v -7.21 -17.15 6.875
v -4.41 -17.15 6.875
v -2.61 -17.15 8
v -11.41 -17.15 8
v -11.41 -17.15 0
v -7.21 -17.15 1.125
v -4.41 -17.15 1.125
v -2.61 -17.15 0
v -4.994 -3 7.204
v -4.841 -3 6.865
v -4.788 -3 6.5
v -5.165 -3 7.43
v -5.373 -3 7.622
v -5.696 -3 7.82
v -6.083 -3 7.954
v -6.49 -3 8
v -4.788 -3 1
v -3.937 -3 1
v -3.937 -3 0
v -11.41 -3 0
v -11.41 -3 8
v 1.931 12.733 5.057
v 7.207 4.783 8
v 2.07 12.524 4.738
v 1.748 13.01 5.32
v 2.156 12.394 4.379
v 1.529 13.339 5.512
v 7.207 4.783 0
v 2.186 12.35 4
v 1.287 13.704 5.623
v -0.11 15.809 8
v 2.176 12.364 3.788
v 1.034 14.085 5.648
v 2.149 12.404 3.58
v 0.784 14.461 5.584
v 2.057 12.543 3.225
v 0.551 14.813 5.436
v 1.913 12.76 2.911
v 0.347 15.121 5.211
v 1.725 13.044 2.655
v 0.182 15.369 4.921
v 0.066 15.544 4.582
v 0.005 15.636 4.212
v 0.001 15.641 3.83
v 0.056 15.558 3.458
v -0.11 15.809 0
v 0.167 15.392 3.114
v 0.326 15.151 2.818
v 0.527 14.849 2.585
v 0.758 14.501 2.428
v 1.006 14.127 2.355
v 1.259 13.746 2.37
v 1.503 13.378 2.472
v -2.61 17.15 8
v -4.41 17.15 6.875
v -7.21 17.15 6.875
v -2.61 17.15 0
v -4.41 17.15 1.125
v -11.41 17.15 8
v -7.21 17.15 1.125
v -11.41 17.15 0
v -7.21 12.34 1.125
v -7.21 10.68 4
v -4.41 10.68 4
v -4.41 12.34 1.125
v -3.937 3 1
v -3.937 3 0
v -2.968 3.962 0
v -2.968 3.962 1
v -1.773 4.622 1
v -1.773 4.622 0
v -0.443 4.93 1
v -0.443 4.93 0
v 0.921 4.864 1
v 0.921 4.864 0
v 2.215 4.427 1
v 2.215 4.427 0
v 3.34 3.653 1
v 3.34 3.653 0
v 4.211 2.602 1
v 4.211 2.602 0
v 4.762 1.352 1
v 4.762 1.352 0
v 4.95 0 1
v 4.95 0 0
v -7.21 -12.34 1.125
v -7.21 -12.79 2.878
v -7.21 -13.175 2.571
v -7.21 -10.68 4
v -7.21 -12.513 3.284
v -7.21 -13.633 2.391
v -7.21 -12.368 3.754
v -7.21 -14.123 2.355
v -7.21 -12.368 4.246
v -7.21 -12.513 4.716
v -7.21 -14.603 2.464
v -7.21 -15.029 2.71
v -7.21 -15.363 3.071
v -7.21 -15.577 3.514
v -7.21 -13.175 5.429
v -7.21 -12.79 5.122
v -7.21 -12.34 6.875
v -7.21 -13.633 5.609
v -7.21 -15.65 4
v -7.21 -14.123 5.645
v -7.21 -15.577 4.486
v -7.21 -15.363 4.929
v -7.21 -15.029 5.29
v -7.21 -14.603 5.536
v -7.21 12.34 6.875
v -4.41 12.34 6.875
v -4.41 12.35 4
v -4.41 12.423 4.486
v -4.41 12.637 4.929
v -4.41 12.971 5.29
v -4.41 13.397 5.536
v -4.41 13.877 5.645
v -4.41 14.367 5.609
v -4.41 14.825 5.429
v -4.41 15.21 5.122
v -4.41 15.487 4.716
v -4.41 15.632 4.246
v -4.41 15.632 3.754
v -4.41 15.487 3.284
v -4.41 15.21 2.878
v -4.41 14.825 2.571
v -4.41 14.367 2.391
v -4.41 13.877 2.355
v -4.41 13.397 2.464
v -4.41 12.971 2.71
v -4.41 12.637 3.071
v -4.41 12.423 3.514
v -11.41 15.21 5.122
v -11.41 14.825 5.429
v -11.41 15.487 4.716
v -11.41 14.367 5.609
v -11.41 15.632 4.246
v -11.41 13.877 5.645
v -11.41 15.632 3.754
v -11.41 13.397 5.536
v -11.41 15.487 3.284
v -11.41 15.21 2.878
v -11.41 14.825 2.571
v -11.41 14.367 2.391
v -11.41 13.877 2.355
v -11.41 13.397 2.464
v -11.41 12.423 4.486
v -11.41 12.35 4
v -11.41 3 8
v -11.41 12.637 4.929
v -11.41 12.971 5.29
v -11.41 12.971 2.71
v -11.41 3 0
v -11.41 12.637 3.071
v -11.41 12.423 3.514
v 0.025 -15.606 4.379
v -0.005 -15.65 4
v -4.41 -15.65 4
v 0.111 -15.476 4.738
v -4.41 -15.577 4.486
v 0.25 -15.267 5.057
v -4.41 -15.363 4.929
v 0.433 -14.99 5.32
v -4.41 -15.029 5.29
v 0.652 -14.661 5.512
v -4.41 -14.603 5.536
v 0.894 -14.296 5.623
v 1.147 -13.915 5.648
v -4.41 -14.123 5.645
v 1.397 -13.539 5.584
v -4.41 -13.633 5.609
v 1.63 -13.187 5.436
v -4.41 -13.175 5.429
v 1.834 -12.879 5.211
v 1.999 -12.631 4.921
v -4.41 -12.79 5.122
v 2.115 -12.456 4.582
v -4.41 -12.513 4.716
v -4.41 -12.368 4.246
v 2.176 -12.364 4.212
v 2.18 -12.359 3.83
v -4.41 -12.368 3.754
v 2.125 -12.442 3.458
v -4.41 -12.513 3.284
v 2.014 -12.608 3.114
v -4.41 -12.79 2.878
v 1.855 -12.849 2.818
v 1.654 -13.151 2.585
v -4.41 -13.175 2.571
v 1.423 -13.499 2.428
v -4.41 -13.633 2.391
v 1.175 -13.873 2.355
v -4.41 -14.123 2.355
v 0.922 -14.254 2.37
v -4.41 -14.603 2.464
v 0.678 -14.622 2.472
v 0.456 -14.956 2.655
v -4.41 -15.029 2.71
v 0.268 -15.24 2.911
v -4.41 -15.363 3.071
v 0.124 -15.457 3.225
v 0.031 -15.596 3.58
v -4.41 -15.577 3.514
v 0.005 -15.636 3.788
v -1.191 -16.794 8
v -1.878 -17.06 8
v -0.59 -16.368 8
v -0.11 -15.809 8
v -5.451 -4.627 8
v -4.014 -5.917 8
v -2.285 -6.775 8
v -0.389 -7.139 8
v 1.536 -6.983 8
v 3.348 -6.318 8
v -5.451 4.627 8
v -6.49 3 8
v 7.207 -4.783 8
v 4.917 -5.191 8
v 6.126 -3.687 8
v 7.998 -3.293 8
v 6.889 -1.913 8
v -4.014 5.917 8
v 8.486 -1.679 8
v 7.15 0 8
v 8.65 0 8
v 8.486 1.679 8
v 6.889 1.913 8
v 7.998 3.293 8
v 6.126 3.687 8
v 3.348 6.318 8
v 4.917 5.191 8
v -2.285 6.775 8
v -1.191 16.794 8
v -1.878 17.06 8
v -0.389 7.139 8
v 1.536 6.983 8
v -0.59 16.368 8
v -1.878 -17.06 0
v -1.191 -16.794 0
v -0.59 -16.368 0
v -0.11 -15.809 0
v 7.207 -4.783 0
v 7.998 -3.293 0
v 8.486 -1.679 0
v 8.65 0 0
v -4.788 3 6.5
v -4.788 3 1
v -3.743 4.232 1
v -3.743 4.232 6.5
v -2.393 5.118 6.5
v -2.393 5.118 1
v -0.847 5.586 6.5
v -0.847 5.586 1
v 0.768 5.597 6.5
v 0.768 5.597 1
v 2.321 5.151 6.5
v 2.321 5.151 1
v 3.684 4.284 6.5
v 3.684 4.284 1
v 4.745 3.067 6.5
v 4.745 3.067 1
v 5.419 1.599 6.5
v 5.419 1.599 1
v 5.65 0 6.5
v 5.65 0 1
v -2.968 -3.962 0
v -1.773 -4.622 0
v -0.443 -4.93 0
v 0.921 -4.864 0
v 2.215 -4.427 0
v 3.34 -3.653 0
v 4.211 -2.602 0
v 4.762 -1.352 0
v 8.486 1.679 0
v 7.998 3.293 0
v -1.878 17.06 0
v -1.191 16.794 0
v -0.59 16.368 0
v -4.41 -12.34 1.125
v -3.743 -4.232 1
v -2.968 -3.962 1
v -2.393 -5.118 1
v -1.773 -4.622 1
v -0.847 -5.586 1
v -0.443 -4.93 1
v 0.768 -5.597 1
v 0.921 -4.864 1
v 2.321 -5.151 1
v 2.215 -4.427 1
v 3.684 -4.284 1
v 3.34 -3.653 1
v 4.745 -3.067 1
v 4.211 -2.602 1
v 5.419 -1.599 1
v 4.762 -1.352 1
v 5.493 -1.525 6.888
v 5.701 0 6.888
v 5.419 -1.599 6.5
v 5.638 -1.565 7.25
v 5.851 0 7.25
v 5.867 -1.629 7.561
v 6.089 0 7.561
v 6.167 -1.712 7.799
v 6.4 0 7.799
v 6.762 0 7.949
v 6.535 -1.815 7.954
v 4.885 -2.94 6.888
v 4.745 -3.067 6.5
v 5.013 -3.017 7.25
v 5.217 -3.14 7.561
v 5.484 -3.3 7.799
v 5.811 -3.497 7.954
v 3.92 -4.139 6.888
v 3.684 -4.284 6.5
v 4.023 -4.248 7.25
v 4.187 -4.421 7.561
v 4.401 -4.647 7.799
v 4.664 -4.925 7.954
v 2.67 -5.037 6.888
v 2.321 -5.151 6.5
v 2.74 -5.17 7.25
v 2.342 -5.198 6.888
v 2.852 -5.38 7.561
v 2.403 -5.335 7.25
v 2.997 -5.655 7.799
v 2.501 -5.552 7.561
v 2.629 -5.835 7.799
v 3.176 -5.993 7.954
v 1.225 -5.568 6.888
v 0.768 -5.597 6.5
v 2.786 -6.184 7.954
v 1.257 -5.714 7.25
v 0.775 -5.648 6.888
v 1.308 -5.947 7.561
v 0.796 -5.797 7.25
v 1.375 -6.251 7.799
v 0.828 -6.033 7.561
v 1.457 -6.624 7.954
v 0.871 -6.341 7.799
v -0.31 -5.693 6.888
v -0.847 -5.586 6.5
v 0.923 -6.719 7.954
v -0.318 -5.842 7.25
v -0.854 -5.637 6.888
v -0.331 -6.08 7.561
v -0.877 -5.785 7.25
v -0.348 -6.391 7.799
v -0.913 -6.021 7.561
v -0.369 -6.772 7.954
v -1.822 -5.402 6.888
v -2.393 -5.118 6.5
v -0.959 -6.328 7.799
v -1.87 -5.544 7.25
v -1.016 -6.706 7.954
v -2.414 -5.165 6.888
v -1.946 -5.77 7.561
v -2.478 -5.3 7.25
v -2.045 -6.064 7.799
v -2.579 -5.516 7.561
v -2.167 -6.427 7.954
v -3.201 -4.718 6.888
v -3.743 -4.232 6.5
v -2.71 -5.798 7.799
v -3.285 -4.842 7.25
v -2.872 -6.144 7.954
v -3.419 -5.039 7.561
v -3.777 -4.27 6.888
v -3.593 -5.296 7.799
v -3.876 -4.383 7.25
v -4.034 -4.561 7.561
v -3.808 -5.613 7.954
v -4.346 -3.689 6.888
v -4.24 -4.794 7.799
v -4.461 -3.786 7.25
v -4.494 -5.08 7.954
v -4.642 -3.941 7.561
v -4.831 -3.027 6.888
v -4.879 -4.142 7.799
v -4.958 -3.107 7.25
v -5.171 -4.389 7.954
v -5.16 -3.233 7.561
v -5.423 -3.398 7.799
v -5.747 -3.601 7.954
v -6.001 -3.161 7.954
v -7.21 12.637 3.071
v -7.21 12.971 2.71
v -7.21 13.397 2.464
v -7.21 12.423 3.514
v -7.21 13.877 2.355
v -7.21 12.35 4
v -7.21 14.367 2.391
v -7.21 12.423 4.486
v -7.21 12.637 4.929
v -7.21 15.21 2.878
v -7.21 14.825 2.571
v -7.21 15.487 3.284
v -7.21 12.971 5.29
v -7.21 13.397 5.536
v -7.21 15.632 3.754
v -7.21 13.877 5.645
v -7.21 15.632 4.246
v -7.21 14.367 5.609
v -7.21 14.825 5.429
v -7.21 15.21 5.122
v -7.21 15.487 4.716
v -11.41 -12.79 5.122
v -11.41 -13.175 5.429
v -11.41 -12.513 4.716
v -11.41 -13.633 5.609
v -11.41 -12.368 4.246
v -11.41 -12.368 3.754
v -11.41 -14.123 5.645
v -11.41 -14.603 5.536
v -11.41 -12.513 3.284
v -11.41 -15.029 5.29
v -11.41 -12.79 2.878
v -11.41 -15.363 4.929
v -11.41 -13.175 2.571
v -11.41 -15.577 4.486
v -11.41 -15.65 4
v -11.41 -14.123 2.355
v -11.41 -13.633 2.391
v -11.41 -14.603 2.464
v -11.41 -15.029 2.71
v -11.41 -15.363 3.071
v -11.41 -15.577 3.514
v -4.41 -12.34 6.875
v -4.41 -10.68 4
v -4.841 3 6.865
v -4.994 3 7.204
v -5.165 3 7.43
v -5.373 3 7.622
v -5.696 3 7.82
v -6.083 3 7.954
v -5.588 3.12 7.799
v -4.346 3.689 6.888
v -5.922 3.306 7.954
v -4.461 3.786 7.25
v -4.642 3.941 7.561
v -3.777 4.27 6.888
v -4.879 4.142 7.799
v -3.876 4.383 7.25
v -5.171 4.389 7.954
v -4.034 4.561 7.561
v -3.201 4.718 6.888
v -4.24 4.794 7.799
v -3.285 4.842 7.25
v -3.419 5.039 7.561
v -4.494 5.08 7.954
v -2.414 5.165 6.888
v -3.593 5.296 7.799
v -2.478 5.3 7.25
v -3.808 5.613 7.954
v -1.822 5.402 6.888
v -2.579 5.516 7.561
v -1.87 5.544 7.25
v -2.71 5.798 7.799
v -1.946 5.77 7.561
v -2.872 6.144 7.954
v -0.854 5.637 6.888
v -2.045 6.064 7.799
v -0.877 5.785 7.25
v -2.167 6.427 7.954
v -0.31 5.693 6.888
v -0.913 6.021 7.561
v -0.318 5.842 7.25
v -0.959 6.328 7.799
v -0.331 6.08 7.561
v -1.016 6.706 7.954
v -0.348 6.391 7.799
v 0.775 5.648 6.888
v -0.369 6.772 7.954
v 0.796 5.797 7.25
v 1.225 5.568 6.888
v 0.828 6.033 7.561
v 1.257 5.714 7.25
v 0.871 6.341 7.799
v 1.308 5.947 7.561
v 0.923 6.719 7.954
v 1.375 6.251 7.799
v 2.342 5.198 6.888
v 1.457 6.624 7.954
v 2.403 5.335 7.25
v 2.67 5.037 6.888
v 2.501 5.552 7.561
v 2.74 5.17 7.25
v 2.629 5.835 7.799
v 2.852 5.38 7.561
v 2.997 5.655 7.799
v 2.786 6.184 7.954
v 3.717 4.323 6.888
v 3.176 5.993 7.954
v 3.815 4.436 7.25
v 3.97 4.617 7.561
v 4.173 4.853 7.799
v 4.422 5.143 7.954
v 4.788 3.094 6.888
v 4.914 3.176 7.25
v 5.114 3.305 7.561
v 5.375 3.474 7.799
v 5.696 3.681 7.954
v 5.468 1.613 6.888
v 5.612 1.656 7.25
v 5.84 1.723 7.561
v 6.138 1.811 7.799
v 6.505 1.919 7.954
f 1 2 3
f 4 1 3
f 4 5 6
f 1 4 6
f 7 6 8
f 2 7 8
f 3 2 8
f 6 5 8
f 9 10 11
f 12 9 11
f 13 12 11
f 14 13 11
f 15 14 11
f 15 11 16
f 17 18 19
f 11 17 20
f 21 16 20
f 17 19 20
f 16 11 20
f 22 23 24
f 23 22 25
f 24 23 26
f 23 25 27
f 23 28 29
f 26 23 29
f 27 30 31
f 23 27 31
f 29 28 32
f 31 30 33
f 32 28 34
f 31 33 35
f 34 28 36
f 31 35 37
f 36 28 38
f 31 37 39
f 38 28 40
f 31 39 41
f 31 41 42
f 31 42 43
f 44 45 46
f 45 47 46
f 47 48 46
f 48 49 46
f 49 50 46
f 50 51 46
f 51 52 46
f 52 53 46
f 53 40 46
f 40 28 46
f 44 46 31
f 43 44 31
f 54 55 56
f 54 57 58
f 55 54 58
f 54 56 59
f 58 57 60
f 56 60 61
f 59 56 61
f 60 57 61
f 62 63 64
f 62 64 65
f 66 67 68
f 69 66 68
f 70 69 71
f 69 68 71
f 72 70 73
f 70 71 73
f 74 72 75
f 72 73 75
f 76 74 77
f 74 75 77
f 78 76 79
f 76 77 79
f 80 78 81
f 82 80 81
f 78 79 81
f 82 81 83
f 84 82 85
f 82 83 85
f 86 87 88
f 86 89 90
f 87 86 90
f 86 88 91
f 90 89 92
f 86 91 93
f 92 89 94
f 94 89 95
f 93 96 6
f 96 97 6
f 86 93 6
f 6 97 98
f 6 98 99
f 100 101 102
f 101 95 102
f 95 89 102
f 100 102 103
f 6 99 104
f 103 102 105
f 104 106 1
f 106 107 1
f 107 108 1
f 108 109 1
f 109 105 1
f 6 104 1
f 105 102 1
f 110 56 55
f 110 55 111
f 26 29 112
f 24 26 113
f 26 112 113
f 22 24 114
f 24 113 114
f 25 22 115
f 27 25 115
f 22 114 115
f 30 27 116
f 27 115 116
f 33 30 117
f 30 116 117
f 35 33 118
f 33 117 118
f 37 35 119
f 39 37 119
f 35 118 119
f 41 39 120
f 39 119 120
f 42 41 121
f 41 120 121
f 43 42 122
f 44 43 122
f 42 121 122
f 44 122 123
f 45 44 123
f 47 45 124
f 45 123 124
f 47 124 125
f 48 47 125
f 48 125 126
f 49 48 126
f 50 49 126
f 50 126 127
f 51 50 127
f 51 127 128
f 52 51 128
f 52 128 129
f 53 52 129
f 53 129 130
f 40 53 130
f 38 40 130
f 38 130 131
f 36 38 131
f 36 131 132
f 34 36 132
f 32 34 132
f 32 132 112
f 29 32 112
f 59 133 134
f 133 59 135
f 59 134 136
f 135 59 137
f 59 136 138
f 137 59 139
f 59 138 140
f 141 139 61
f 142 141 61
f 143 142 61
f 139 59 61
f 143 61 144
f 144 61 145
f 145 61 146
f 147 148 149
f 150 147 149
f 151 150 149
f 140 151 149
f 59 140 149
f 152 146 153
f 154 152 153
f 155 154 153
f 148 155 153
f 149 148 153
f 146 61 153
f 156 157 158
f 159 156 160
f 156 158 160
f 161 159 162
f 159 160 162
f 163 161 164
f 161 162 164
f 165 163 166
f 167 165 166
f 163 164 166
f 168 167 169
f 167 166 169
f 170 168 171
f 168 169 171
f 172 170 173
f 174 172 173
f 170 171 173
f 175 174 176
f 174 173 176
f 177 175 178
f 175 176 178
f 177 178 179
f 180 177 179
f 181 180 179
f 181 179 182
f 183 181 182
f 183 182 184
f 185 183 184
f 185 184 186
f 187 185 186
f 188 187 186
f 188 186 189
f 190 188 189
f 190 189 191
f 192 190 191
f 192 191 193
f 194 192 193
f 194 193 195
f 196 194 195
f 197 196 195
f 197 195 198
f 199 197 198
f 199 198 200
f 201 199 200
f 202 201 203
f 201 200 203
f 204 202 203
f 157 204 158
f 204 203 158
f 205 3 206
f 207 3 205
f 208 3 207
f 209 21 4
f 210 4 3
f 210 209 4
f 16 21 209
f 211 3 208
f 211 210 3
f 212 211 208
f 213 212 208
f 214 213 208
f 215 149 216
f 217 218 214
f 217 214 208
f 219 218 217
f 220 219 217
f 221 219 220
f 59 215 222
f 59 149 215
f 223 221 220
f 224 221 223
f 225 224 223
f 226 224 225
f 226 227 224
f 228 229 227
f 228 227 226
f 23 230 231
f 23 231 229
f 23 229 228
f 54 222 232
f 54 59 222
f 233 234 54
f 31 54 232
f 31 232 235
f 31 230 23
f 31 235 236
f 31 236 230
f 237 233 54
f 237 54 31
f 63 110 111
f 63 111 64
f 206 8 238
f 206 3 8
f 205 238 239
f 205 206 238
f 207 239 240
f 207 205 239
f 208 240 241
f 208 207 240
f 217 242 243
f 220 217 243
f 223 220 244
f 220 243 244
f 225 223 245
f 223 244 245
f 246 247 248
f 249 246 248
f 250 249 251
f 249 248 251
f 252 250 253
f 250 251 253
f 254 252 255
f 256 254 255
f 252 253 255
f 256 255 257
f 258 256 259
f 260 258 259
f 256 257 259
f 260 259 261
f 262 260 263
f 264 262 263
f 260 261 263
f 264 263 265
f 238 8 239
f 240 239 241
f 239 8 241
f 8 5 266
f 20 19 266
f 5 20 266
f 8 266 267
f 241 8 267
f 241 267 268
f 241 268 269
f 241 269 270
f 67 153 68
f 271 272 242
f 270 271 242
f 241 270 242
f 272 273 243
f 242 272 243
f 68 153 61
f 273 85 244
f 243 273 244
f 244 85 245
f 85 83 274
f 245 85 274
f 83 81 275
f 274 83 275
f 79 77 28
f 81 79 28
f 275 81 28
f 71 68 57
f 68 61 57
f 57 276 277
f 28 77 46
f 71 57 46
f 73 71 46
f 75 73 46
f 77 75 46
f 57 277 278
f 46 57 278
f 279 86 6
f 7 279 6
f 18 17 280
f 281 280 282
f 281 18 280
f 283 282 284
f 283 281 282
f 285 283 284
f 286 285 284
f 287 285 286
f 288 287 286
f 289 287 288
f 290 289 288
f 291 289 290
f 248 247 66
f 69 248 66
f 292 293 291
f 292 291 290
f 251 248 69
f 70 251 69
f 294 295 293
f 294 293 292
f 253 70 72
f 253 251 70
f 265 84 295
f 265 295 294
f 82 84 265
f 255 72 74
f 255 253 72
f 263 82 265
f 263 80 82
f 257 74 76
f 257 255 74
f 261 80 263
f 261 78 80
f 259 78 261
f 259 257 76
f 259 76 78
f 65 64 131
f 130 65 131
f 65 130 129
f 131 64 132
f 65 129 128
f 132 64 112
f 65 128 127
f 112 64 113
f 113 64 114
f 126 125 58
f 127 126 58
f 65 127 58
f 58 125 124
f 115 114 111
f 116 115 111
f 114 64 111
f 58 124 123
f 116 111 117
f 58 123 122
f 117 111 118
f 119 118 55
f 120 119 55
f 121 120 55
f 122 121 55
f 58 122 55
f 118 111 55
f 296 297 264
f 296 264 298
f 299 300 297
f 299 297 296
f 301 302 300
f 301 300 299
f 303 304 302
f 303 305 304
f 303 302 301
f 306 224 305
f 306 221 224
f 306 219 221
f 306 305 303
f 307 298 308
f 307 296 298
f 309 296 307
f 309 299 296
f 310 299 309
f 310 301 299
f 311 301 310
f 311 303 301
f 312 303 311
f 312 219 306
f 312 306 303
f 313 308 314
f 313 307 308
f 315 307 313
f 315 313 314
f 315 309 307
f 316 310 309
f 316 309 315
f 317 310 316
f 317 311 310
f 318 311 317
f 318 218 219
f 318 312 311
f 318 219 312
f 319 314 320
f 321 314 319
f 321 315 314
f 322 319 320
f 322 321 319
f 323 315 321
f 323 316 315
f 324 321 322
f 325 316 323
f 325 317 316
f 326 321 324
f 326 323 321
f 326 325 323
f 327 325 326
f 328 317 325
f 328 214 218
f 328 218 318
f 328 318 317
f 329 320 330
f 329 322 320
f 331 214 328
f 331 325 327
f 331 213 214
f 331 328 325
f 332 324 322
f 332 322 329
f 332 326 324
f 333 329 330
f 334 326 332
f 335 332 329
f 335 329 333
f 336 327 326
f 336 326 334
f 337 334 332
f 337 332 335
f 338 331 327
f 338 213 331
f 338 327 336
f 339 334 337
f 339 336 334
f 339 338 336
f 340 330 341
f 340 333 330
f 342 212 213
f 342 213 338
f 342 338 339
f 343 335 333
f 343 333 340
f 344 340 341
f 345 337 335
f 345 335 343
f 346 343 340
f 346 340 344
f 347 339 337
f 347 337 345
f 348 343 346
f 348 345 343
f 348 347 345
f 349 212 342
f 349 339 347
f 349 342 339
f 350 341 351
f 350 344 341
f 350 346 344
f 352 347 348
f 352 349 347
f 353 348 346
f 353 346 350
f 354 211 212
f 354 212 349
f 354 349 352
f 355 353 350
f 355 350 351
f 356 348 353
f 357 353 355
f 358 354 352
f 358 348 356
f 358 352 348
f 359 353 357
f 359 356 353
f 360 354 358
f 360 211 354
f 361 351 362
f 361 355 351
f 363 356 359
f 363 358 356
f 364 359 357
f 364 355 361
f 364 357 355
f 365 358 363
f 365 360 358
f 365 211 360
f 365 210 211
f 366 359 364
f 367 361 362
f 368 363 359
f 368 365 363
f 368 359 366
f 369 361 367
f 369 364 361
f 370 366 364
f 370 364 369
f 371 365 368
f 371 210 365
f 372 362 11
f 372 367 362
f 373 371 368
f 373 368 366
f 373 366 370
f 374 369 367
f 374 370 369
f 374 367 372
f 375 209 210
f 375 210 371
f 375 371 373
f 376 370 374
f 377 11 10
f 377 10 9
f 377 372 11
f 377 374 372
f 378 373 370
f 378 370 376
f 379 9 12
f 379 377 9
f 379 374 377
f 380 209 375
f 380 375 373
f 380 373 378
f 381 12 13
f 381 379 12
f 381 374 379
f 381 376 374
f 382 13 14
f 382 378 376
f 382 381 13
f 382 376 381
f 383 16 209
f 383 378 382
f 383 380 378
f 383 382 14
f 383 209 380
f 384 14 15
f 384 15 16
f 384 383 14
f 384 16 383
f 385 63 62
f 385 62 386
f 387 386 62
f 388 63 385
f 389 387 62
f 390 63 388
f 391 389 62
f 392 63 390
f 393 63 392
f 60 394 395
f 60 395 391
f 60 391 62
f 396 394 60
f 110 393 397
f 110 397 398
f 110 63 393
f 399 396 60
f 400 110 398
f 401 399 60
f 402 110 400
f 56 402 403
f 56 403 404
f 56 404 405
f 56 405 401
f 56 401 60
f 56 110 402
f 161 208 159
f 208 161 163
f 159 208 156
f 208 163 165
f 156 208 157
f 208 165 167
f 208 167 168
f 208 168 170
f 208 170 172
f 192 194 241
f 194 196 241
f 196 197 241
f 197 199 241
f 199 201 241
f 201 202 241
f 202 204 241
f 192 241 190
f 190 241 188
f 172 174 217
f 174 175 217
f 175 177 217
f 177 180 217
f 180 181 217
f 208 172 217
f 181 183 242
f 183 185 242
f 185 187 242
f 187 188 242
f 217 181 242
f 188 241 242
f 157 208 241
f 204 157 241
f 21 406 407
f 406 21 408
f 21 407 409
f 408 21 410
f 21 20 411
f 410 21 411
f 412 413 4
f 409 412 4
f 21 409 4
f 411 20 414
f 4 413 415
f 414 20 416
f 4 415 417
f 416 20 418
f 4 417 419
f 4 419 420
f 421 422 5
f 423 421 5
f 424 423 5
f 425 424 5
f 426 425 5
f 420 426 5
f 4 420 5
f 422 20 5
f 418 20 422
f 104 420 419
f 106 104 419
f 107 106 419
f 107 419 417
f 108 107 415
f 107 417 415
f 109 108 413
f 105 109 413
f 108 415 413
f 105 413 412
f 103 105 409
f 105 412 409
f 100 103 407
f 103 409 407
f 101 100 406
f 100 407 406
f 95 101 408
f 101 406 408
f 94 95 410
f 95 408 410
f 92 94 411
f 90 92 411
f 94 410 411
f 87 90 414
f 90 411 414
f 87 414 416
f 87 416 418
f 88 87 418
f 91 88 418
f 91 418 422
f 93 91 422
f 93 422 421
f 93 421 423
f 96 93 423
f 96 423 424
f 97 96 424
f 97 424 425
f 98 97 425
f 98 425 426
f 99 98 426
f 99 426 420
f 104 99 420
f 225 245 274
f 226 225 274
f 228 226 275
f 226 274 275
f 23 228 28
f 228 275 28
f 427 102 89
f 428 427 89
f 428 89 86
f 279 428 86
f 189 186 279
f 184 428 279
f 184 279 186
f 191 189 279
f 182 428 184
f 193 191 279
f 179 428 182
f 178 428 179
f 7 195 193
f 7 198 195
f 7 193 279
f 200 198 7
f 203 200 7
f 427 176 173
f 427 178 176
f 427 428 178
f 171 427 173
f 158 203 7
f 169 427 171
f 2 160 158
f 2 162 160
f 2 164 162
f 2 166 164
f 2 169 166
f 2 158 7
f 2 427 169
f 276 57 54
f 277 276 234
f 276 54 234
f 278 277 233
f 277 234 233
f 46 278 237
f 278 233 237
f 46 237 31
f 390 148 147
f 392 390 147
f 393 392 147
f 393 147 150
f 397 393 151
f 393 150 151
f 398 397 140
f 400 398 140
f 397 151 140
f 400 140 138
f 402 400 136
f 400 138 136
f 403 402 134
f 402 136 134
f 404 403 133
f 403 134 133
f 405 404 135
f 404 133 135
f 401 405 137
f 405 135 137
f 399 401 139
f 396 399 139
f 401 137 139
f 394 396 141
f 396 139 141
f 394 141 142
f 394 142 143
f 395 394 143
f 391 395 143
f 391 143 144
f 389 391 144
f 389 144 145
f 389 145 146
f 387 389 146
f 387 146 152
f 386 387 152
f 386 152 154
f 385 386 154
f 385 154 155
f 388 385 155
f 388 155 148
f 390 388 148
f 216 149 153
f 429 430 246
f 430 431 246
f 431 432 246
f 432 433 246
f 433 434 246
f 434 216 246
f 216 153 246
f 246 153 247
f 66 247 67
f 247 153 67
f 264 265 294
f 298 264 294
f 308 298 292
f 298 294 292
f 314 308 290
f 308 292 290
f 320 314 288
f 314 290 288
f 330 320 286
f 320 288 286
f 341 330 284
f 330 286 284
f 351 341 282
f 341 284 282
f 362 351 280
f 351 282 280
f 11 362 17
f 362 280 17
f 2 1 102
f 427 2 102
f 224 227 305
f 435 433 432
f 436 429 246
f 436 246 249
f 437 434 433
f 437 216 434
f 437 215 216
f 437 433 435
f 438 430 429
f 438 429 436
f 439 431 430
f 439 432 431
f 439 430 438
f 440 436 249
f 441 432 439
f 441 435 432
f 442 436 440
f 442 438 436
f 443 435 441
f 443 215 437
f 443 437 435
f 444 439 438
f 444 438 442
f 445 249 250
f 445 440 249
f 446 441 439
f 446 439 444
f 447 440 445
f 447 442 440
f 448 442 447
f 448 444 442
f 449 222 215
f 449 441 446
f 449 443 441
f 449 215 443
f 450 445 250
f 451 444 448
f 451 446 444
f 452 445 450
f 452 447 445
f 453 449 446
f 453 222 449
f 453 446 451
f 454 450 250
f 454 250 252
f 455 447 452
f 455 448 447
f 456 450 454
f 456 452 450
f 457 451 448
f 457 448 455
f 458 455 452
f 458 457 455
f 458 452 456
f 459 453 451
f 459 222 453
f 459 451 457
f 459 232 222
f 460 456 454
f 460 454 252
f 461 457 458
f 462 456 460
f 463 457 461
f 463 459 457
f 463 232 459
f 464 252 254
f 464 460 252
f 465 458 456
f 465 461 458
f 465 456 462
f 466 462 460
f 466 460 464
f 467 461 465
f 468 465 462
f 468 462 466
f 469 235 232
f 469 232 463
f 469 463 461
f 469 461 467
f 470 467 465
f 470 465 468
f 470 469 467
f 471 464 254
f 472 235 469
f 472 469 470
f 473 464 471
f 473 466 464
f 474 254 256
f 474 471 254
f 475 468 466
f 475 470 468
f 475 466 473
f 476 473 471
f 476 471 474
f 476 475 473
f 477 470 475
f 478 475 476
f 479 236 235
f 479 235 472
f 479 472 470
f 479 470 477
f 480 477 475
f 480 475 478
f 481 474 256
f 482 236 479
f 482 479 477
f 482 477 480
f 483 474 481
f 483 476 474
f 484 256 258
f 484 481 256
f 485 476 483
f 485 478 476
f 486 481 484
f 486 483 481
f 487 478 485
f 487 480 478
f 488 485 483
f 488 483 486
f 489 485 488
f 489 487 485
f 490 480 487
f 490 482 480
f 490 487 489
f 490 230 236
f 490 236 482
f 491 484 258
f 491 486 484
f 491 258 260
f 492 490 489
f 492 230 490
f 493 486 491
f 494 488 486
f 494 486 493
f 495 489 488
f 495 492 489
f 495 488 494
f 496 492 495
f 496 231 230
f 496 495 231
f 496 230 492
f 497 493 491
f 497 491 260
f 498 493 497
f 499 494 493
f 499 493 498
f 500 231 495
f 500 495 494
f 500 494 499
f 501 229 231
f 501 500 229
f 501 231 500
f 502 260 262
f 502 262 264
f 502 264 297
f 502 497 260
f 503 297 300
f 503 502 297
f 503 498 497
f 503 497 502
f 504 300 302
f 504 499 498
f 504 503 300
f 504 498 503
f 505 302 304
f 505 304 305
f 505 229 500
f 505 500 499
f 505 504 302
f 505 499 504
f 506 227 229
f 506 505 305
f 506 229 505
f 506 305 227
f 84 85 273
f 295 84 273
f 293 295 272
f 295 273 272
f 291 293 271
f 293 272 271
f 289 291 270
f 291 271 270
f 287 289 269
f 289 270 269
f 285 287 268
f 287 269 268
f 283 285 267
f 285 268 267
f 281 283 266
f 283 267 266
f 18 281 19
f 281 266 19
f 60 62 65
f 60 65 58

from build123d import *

# Parameters (mm, degrees)
F3_DEPTH = 8
F4_DEPTH = 1
F5_R     = 1.65
F6_DEPTH = 13.5965032877
F9_DEPTH = 2.8
F10_R    = 1.5
F11_R    = 3


# Not quite as in the source:
# - a pattern or mirror of a feature is missing from the dataset's text; its kind, count and spacing are read off the source's solid
# - a feature names something its author has since deleted; it is built from what else it names


with BuildPart() as f3:
    # F2 (on Top) → F3 (new body)
    with BuildSketch(Plane.XY):
        with BuildLine():
            Line((-11.41, 3), (-8.1131066799, 3))
            ThreePointArc((-8.1131066799, 3), (-0.999988831, 8.5920033949), (7.2072655829, 4.7830767104))
            Line((7.2072655829, 4.7830767104), (-1, 17.15))
            Line((-1, 17.15), (-11.41, 17.15))
            Line((-11.41, 17.15), (-11.41, 3))
        make_face()
        with BuildLine():
            ThreePointArc((7.2072655829, -4.7830767104), (-0.999988831, -8.5920033949), (-8.1131066799, -3))
            Line((-8.1131066799, -3), (-11.41, -3))
            Line((-11.41, -3), (-11.41, -17.15))
            Line((-11.41, -17.15), (-1, -17.15))
            Line((-1, -17.15), (7.2072655829, -4.7830767104))
        make_face()
        with BuildLine():
            ThreePointArc((-4.7877447718, 3), (1.5607277212, 5.430159204), (5.65, 0))
            ThreePointArc((5.65, 0), (1.5607277212, -5.430159204), (-4.7877447718, -3))
            Line((-4.7877447718, -3), (-8.1131066799, -3))
            ThreePointArc((-8.1131066799, -3), (-0.999988831, -8.5920033949), (7.2072655829, -4.7830767104))
            ThreePointArc((7.2072655829, -4.7830767104), (8.2814656702, -2.4979644421), (8.65, 0))
            ThreePointArc((8.65, 0), (8.2814656702, 2.4979644421), (7.2072655829, 4.7830767104))
            ThreePointArc((7.2072655829, 4.7830767104), (-0.999988831, 8.5920033949), (-8.1131066799, 3))
            Line((-8.1131066799, 3), (-4.7877447718, 3))
        make_face()
    extrude(amount=F3_DEPTH)

    # F2 (on Top) → F4 (join)
    with BuildSketch(Plane.XY):
        with BuildLine():
            ThreePointArc((-4.7877447718, -3), (1.5607277212, -5.430159204), (5.65, 0))
            ThreePointArc((5.65, 0), (1.5607277212, 5.430159204), (-4.7877447718, 3))
            Line((-4.7877447718, 3), (-3.9373214245, 3))
            ThreePointArc((-3.9373214245, 3), (1.5831549117, 4.6900021882), (4.95, 0))
            ThreePointArc((4.95, 0), (1.5831549117, -4.6900021882), (-3.9373214245, -3))
            Line((-3.9373214245, -3), (-4.7877447718, -3))
        make_face()
    extrude(amount=F4_DEPTH)

    # F5 (on face) → F6 (cut, through all)
    with BuildSketch(Plane(origin=(-11.41, 0, 0), x_dir=(0, -1, 0), z_dir=(-1, 0, 0))):
        with Locations((14, 4)):
            Circle(F5_R)
        with Locations((-14, 4)):
            Circle(F5_R)
    extrude(amount=-F6_DEPTH, mode=Mode.SUBTRACT)

    # F8 (on offset) → F9 (cut)
    with BuildSketch(Plane(origin=(-7.21, 0, 0), x_dir=(0, -1, 0), z_dir=(-1, 0, 0))):
        Polygon((17.15, 6.875), (15.6598820239, 6.875), (17.15, 4.2940399562), align=None)
        Polygon((17.15, 4.2940399562), (15.6598820239, 6.875), (12.3401179761, 6.875), (10.6802359522, 4), (12.3401179761, 1.125), (15.6598820239, 1.125), (17.15, 3.7059600438), align=None)
        Polygon((17.3197640478, 4), (17.15, 4.2940399562), (17.15, 3.7059600438), align=None)
        Polygon((17.15, 1.125), (17.15, 3.7059600438), (15.6598820239, 1.125), align=None)
    f9 = extrude(amount=-F9_DEPTH, mode=Mode.SUBTRACT)

    # F9_copies: F9 across plane
    add(f9.mirror(Plane.ZX), mode=Mode.SUBTRACT)

    # F10
    f10_edges = [f3.edges().sort_by_distance(p)[0] for p in [
        (5.65, 0, 8),
    ]]
    fillet(f10_edges, radius=F10_R)

    # F11
    f11_edges = [f3.edges().sort_by_distance(p)[0] for p in [
        (-1, -17.15, 4),
        (-1, 17.15, 4),
    ]]
    fillet(f11_edges, radius=F11_R)


solid = f3.part
